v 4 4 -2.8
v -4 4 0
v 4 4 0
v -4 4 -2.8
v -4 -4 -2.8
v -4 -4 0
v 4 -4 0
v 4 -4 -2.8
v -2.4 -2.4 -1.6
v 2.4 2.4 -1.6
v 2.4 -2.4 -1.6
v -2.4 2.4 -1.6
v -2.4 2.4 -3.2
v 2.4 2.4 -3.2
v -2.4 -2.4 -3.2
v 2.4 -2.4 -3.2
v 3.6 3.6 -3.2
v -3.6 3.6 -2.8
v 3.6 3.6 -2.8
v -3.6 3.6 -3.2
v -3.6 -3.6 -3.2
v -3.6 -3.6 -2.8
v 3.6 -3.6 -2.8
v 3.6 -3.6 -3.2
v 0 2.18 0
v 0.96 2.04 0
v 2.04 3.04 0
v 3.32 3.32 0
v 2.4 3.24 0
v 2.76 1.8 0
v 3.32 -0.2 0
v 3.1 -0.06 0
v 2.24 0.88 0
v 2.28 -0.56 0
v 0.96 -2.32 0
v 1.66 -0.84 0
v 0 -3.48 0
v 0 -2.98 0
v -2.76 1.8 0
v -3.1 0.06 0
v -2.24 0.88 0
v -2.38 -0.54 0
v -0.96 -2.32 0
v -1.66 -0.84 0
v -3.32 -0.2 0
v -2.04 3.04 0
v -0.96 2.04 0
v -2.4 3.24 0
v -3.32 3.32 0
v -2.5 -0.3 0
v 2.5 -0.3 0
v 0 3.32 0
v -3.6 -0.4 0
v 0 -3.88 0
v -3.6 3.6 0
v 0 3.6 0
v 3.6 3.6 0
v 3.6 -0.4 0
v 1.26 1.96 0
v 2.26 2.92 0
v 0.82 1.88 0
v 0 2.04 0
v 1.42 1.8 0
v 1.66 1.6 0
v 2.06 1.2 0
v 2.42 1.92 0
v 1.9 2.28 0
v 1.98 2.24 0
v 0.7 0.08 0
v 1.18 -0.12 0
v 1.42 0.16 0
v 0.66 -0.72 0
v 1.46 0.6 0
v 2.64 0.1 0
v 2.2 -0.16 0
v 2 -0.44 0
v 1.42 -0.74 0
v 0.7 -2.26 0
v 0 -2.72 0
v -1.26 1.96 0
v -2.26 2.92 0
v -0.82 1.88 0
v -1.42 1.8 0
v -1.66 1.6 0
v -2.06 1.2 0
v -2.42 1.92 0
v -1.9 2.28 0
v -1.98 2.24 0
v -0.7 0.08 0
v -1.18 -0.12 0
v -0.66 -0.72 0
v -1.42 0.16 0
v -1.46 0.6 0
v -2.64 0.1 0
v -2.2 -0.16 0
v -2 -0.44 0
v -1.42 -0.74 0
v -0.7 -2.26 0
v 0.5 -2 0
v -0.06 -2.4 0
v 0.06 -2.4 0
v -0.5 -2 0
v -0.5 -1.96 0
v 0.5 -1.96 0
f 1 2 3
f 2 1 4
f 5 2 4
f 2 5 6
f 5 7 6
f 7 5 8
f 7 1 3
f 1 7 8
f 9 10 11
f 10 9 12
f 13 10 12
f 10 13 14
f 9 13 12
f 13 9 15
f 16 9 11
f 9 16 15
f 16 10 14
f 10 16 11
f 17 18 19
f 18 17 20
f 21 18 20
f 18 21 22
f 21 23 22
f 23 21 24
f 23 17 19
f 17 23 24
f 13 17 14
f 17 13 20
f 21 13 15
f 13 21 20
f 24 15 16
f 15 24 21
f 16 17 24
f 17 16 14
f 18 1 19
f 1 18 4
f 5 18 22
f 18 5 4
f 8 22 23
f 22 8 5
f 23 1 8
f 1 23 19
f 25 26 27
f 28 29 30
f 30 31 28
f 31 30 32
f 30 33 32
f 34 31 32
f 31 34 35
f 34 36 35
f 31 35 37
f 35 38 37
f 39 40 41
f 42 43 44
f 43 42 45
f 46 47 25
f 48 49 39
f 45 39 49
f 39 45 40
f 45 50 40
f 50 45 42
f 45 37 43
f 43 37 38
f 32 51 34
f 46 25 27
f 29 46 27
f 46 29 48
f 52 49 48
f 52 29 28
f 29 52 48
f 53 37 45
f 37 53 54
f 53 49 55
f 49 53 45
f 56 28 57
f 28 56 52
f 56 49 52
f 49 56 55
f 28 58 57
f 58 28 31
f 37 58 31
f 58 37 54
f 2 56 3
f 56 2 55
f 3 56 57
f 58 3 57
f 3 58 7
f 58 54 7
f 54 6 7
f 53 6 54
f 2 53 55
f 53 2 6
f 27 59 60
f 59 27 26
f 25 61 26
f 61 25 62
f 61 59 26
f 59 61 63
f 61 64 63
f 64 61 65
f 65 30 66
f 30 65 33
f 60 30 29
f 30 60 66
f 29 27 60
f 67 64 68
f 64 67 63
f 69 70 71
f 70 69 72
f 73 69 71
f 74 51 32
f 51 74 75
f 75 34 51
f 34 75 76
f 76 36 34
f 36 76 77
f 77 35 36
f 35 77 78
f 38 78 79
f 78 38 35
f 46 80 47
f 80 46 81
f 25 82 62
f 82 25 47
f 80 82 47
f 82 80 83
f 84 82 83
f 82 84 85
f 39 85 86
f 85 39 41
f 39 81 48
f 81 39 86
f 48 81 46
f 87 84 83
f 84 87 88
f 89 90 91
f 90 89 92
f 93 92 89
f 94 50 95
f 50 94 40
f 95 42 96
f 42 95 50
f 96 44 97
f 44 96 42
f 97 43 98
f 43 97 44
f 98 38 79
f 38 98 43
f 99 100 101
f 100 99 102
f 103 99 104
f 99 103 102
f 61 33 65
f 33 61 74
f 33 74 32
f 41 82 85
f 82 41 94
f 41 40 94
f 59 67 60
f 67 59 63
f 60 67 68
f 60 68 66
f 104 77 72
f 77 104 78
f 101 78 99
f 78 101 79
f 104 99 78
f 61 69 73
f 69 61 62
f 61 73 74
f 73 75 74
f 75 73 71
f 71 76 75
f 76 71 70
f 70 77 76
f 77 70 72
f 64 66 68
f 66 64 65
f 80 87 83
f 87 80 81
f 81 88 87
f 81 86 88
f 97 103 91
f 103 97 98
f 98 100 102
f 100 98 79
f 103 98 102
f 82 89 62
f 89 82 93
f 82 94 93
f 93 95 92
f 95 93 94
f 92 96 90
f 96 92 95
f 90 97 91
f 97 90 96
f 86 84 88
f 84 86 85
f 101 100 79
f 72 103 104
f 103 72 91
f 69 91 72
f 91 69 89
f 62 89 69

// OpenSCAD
// file: ../p/box5.scad
use <../lib.scad>
function ldraw_lib__box5() = [
// 0 Box with 5 Faces and All Edges
// 0 Name: box5.dat
// 0 Author: James Jessiman
// 0 !LDRAW_ORG Primitive UPDATE 2012-01
// 0 !LICENSE Licensed under CC BY 2.0 and CC BY 4.0 : see CAreadme.txt
// 
// 0 BFC CERTIFY CCW
  [0,"BFC","CERTIFY"],
  [0,"BFC","CCW"],
// 
// 0 !HISTORY 2002-04-03 [sbliss] Modified for BFC compliance
// 0 !HISTORY 2002-04-25 [PTadmin] Official Update 2002-02
// 0 !HISTORY 2007-06-24 [PTadmin] Header formatted for Contributor Agreement
// 0 !HISTORY 2008-07-01 [PTadmin] Official Update 2008-01
// 0 !HISTORY 2012-02-16 [Philo] Changed to CCW
// 0 !HISTORY 2012-03-30 [PTadmin] Official Update 2012-01
// 
// 
// 2 24 1 1 1 -1 1 1
  [2,24,1,1,1,-1,1,1],
// 2 24 -1 1 1 -1 1 -1
  [2,24,-1,1,1,-1,1,-1],
// 2 24 -1 1 -1 1 1 -1
  [2,24,-1,1,-1,1,1,-1],
// 2 24 1 1 -1 1 1 1
  [2,24,1,1,-1,1,1,1],
// 2 24 1 0 1 -1 0 1
  [2,24,1,0,1,-1,0,1],
// 2 24 -1 0 1 -1 0 -1
  [2,24,-1,0,1,-1,0,-1],
// 2 24 -1 0 -1 1 0 -1
  [2,24,-1,0,-1,1,0,-1],
// 2 24 1 0 -1 1 0 1
  [2,24,1,0,-1,1,0,1],
// 2 24 1 0 1 1 1 1
  [2,24,1,0,1,1,1,1],
// 2 24 -1 0 1 -1 1 1
  [2,24,-1,0,1,-1,1,1],
// 2 24 1 0 -1 1 1 -1
  [2,24,1,0,-1,1,1,-1],
// 2 24 -1 0 -1 -1 1 -1
  [2,24,-1,0,-1,-1,1,-1],
// 4 16 -1 1 1 1 1 1 1 1 -1 -1 1 -1
  [4,16,-1,1,1,1,1,1,1,1,-1,-1,1,-1],
// 4 16 -1 1 1 -1 0 1 1 0 1 1 1 1
  [4,16,-1,1,1,-1,0,1,1,0,1,1,1,1],
// 4 16 -1 1 -1 -1 0 -1 -1 0 1 -1 1 1
  [4,16,-1,1,-1,-1,0,-1,-1,0,1,-1,1,1],
// 4 16 1 1 -1 1 0 -1 -1 0 -1 -1 1 -1
  [4,16,1,1,-1,1,0,-1,-1,0,-1,-1,1,-1],
// 4 16 1 1 1 1 0 1 1 0 -1 1 1 -1
  [4,16,1,1,1,1,0,1,1,0,-1,1,1,-1],
];
module ldraw_lib__box5(step=0, col=false, unit=2/5, alt=false, line=0.2, solid=!$preview)
    makepoly(ldraw_lib__box5(), step=step, col=col, unit=unit, alt=alt, line=line, solid=solid);
ldraw_lib__box5(line=0.2);
// file: ../p/box4.scad
use <../lib.scad>
function ldraw_lib__box4() = [
// 0 Box with 4 Faces (2 Parallel Pairs) and All Edges
// 0 Name: box4.dat
// 0 Author: James Jessiman
// 0 !LDRAW_ORG Primitive UPDATE 2012-01
// 0 !LICENSE Licensed under CC BY 2.0 and CC BY 4.0 : see CAreadme.txt
// 
// 0 BFC CERTIFY CCW
  [0,"BFC","CERTIFY"],
  [0,"BFC","CCW"],
// 
// 0 !HISTORY 2002-04-03 [sbliss] Modified for BFC compliance
// 0 !HISTORY 2002-04-25 [PTadmin] Official Update 2002-02
// 0 !HISTORY 2007-06-24 [PTadmin] Header formatted for Contributor Agreement
// 0 !HISTORY 2008-07-01 [PTadmin] Official Update 2008-01
// 0 !HISTORY 2012-02-16 [Philo] Changed to CCW
// 0 !HISTORY 2012-03-30 [PTadmin] Official Update 2012-01
// 
// 
// 2 24 1 1 1 -1 1 1
  [2,24,1,1,1,-1,1,1],
// 2 24 -1 1 1 -1 1 -1
  [2,24,-1,1,1,-1,1,-1],
// 2 24 -1 1 -1 1 1 -1
  [2,24,-1,1,-1,1,1,-1],
// 2 24 1 1 -1 1 1 1
  [2,24,1,1,-1,1,1,1],
// 2 24 1 0 1 -1 0 1
  [2,24,1,0,1,-1,0,1],
// 2 24 -1 0 1 -1 0 -1
  [2,24,-1,0,1,-1,0,-1],
// 2 24 -1 0 -1 1 0 -1
  [2,24,-1,0,-1,1,0,-1],
// 2 24 1 0 -1 1 0 1
  [2,24,1,0,-1,1,0,1],
// 2 24 1 0 1 1 1 1
  [2,24,1,0,1,1,1,1],
// 2 24 -1 0 1 -1 1 1
  [2,24,-1,0,1,-1,1,1],
// 2 24 1 0 -1 1 1 -1
  [2,24,1,0,-1,1,1,-1],
// 2 24 -1 0 -1 -1 1 -1
  [2,24,-1,0,-1,-1,1,-1],
// 4 16 -1 1 1 -1 0 1 1 0 1 1 1 1
  [4,16,-1,1,1,-1,0,1,1,0,1,1,1,1],
// 4 16 -1 1 -1 -1 0 -1 -1 0 1 -1 1 1
  [4,16,-1,1,-1,-1,0,-1,-1,0,1,-1,1,1],
// 4 16 1 1 -1 1 0 -1 -1 0 -1 -1 1 -1
  [4,16,1,1,-1,1,0,-1,-1,0,-1,-1,1,-1],
// 4 16 1 1 1 1 0 1 1 0 -1 1 1 -1
  [4,16,1,1,1,1,0,1,1,0,-1,1,1,-1],
];
module ldraw_lib__box4(step=0, col=false, unit=2/5, alt=false, line=0.2, solid=!$preview)
    makepoly(ldraw_lib__box4(), step=step, col=col, unit=unit, alt=alt, line=line, solid=solid);
ldraw_lib__box4(line=0.2);
// file: s/3070bs01.scad
use <../../lib.scad>
use <../../p/box4.scad>
use <../../p/box5.scad>
function ldraw_lib__s__3070bs01() = [
// 0 ~Tile  1 x  1 with Groove without Top Face
// 0 Name: s\3070bs01.dat
// 0 Author: Chris Dee [cwdee]
// 0 !LDRAW_ORG Subpart UPDATE 2009-02
// 0 !LICENSE Licensed under CC BY 2.0 and CC BY 4.0 : see CAreadme.txt
// 
// 0 BFC CERTIFY CCW
  [0,"BFC","CERTIFY"],
  [0,"BFC","CCW"],
// 
// 0 !HISTORY 2009-09-03 [PTadmin] Official Update 2009-02
// 
// 
// 1 16 0 0 0 10 0 0 0 7 0 0 0 10 box4.dat
  [1,16,0,0,0,10,0,0,0,7,0,0,0,10, ldraw_lib__box4()],
// 0 BFC INVERTNEXT
  [0,"BFC","INVERTNEXT"],
// 1 16 0 8 0 6 0 0 0 -4 0 0 0 6 box5.dat
  [1,16,0,8,0,6,0,0,0,-4,0,0,0,6, ldraw_lib__box5()],
// 1 16 0 7 0 9 0 0 0 1 0 0 0 9 box4.dat
  [1,16,0,7,0,9,0,0,0,1,0,0,0,9, ldraw_lib__box4()],
// 
// 4 16 9 8 9 6 8 6 -6 8 6 -9 8 9
  [4,16,9,8,9,6,8,6,-6,8,6,-9,8,9],
// 4 16 -9 8 9 -6 8 6 -6 8 -6 -9 8 -9
  [4,16,-9,8,9,-6,8,6,-6,8,-6,-9,8,-9],
// 4 16 -9 8 -9 -6 8 -6 6 8 -6 9 8 -9
  [4,16,-9,8,-9,-6,8,-6,6,8,-6,9,8,-9],
// 4 16 9 8 -9 6 8 -6 6 8 6 9 8 9
  [4,16,9,8,-9,6,8,-6,6,8,6,9,8,9],
// 
// 4 16 10 7 10 9 7 9 -9 7 9 -10 7 10
  [4,16,10,7,10,9,7,9,-9,7,9,-10,7,10],
// 4 16 -10 7 10 -9 7 9 -9 7 -9 -10 7 -10
  [4,16,-10,7,10,-9,7,9,-9,7,-9,-10,7,-10],
// 4 16 -10 7 -10 -9 7 -9 9 7 -9 10 7 -10
  [4,16,-10,7,-10,-9,7,-9,9,7,-9,10,7,-10],
// 4 16 10 7 -10 9 7 -9 9 7 9 10 7 10
  [4,16,10,7,-10,9,7,-9,9,7,9,10,7,10],
// 0
];
module ldraw_lib__s__3070bs01(step=0, col=false, unit=2/5, alt=false, line=0.2, solid=!$preview)
    makepoly(ldraw_lib__s__3070bs01(), step=step, col=col, unit=unit, alt=alt, line=line, solid=solid);
ldraw_lib__s__3070bs01(line=0.2);
// file: s/3070bpe0s04.scad
use <../../lib.scad>
function ldraw_lib__s__3070bpe0s04() = [
// 0 ~Fox Head
// 0 Name: s\3070bpe0s04.dat
// 0 Author: Johann Eisner [technicbasics]
// 0 !LDRAW_ORG Subpart UPDATE 2019-03
// 0 !LICENSE Licensed under CC BY 2.0 and CC BY 4.0 : see CAreadme.txt
// 
// 0 BFC CERTIFY CCW
  [0,"BFC","CERTIFY"],
  [0,"BFC","CCW"],
// 
// 0 !HISTORY 2019-12-27 [PTadmin] Official Update 2019-03
// 
// 
// 4 16 3.15 0 4.9 3.55 0 4.5 4.75 0 5.7 5.65 0 7.3
  [4,16,3.15,0,4.9,3.55,0,4.5,4.75,0,5.7,5.65,0,7.3],
// 3 16 5.65 0 7.3 4.75 0 5.7 4.95 0 5.6
  [3,16,5.65,0,7.3,4.75,0,5.7,4.95,0,5.6],
// 3 16 5.65 0 7.3 4.95 0 5.6 6.05 0 4.8
  [3,16,5.65,0,7.3,4.95,0,5.6,6.05,0,4.8],
// 4 16 3.55 0 -1.85 1.65 0 -1.8 1.25 0 -4.9 1.75 0 -5.65
  [4,16,3.55,0,-1.85,1.65,0,-1.8,1.25,0,-4.9,1.75,0,-5.65],
// 4 16 0.15 0 -6 0 0 -6.8 1.75 0 -5.65 1.25 0 -5
  [4,16,0.15,0,-6,0,0,-6.8,1.75,0,-5.65,1.25,0,-5],
// 3 16 1.25 0 -4.9 1.25 0 -5 1.75 0 -5.65
  [3,16,1.25,0,-4.9,1.25,0,-5,1.75,0,-5.65],
// 4 16 2.05 0 4.7 0 0 5.1 1.75 0 0.2 3.65 0 1.5
  [4,16,2.05,0,4.7,0,0,5.1,1.75,0,0.2,3.65,0,1.5],
// 3 16 2.05 0 4.7 3.65 0 1.5 6.6 0 0.25
  [3,16,2.05,0,4.7,3.65,0,1.5,6.6,0,0.25],
// 4 16 6.6 0 0.25 3.65 0 1.5 3.55 0 0.4 5.5 0 -0.4
  [4,16,6.6,0,0.25,3.65,0,1.5,3.55,0,0.4,5.5,0,-0.4],
// 4 16 5.5 0 -0.4 3.55 0 0.4 2.95 0 -0.3 5 0 -1.1
  [4,16,5.5,0,-0.4,3.55,0,0.4,2.95,0,-0.3,5,0,-1.1],
// 4 16 5 0 -1.1 2.95 0 -0.3 1.65 0 -1.8 3.55 0 -1.85
  [4,16,5,0,-1.1,2.95,0,-0.3,1.65,0,-1.8,3.55,0,-1.85],
// 4 16 6.05 0 4.8 4.95 0 5.6 4.15 0 4 5.15 0 3
  [4,16,6.05,0,4.8,4.95,0,5.6,4.15,0,4,5.15,0,3],
// 4 16 -4.75 0 5.7 -3.55 0 4.5 -3.15 0 4.9 -5.65 0 7.3
  [4,16,-4.75,0,5.7,-3.55,0,4.5,-3.15,0,4.9,-5.65,0,7.3],
// 3 16 -5.65 0 7.3 -4.95 0 5.6 -4.75 0 5.7
  [3,16,-5.65,0,7.3,-4.95,0,5.6,-4.75,0,5.7],
// 3 16 -5.65 0 7.3 -6.05 0 4.8 -4.95 0 5.6
  [3,16,-5.65,0,7.3,-6.05,0,4.8,-4.95,0,5.6],
// 4 16 -1.25 0 -4.9 -1.65 0 -1.8 -3.55 0 -1.85 -1.75 0 -5.65
  [4,16,-1.25,0,-4.9,-1.65,0,-1.8,-3.55,0,-1.85,-1.75,0,-5.65],
// 4 16 -1.75 0 -5.65 0 0 -6.8 -0.15 0 -6 -1.25 0 -5
  [4,16,-1.75,0,-5.65,0,0,-6.8,-0.15,0,-6,-1.25,0,-5],
// 3 16 -1.25 0 -4.9 -1.75 0 -5.65 -1.25 0 -5
  [3,16,-1.25,0,-4.9,-1.75,0,-5.65,-1.25,0,-5],
// 4 16 -1.75 0 0.2 0 0 5.1 -2.05 0 4.7 -3.65 0 1.5
  [4,16,-1.75,0,0.2,0,0,5.1,-2.05,0,4.7,-3.65,0,1.5],
// 3 16 -2.05 0 4.7 -6.6 0 0.25 -3.65 0 1.5
  [3,16,-2.05,0,4.7,-6.6,0,0.25,-3.65,0,1.5],
// 4 16 -3.55 0 0.4 -3.65 0 1.5 -6.6 0 0.25 -5.5 0 -0.4
  [4,16,-3.55,0,0.4,-3.65,0,1.5,-6.6,0,0.25,-5.5,0,-0.4],
// 4 16 -2.95 0 -0.3 -3.55 0 0.4 -5.5 0 -0.4 -5 0 -1.1
  [4,16,-2.95,0,-0.3,-3.55,0,0.4,-5.5,0,-0.4,-5,0,-1.1],
// 4 16 -1.65 0 -1.8 -2.95 0 -0.3 -5 0 -1.1 -3.55 0 -1.85
  [4,16,-1.65,0,-1.8,-2.95,0,-0.3,-5,0,-1.1,-3.55,0,-1.85],
// 4 16 -4.15 0 4 -4.95 0 5.6 -6.05 0 4.8 -5.15 0 3
  [4,16,-4.15,0,4,-4.95,0,5.6,-6.05,0,4.8,-5.15,0,3],
// 3 16 0.15 0 -6 -0.15 0 -6 0 0 -6.8
  [3,16,0.15,0,-6,-0.15,0,-6,0,0,-6.8],
// 4 16 -1.25 0 -4.9 1.25 0 -4.9 1.65 0 -1.8 -1.65 0 -1.8
  [4,16,-1.25,0,-4.9,1.25,0,-4.9,1.65,0,-1.8,-1.65,0,-1.8],
// 4 16 -1.65 0 -1.8 1.65 0 -1.8 1.75 0 0.2 -1.75 0 0.2
  [4,16,-1.65,0,-1.8,1.65,0,-1.8,1.75,0,0.2,-1.75,0,0.2],
// 3 16 0 0 5.1 -1.75 0 0.2 1.75 0 0.2
  [3,16,0,0,5.1,-1.75,0,0.2,1.75,0,0.2],
];
module ldraw_lib__s__3070bpe0s04(step=0, col=false, unit=2/5, alt=false, line=0.2, solid=!$preview)
    makepoly(ldraw_lib__s__3070bpe0s04(), step=step, col=col, unit=unit, alt=alt, line=line, solid=solid);
ldraw_lib__s__3070bpe0s04(line=0.2);
// file: s/3070bpe0s03.scad
use <../../lib.scad>
function ldraw_lib__s__3070bpe0s03() = [
// 0 ~Fox Head Shadow
// 0 Name: s\3070bpe0s03.dat
// 0 Author: Johann Eisner [technicbasics]
// 0 !LDRAW_ORG Subpart UPDATE 2019-03
// 0 !LICENSE Licensed under CC BY 2.0 and CC BY 4.0 : see CAreadme.txt
// 
// 0 BFC CERTIFY CCW
  [0,"BFC","CERTIFY"],
  [0,"BFC","CCW"],
// 
// 0 !HISTORY 2019-12-27 [PTadmin] Official Update 2019-03
// 
// 
// 4 16 2.4 0 5.1 3.15 0 4.9 5.65 0 7.3 5.1 0 7.6
  [4,16,2.4,0,5.1,3.15,0,4.9,5.65,0,7.3,5.1,0,7.6],
// 4 16 0 0 5.45 0 0 5.1 2.05 0 4.7 2.4 0 5.1
  [4,16,0,0,5.45,0,0,5.1,2.05,0,4.7,2.4,0,5.1],
// 4 16 3.15 0 4.9 2.4 0 5.1 2.05 0 4.7 3.55 0 4.5
  [4,16,3.15,0,4.9,2.4,0,5.1,2.05,0,4.7,3.55,0,4.5],
// 4 16 4.15 0 4 3.55 0 4.5 2.05 0 4.7 5.15 0 3
  [4,16,4.15,0,4,3.55,0,4.5,2.05,0,4.7,5.15,0,3],
// 4 16 6.9 0 4.5 6.05 0 4.8 5.15 0 3 5.6 0 2.2
  [4,16,6.9,0,4.5,6.05,0,4.8,5.15,0,3,5.6,0,2.2],
// 4 16 6.05 0 4.8 6.9 0 4.5 6 0 8.1 5.65 0 7.3
  [4,16,6.05,0,4.8,6.9,0,4.5,6,0,8.1,5.65,0,7.3],
// 3 16 6 0 8.1 5.1 0 7.6 5.65 0 7.3
  [3,16,6,0,8.1,5.1,0,7.6,5.65,0,7.3],
// 4 16 3.55 0 4.5 4.15 0 4 4.95 0 5.6 4.75 0 5.7
  [4,16,3.55,0,4.5,4.15,0,4,4.95,0,5.6,4.75,0,5.7],
// 4 16 1.75 0 0.2 1.65 0 -1.8 2.95 0 -0.3 3.55 0 0.4
  [4,16,1.75,0,0.2,1.65,0,-1.8,2.95,0,-0.3,3.55,0,0.4],
// 3 16 3.65 0 1.5 1.75 0 0.2 3.55 0 0.4
  [3,16,3.65,0,1.5,1.75,0,0.2,3.55,0,0.4],
// 4 16 7.75 0 -0.15 6.6 0 0.25 5.5 0 -0.4 6.25 0 -0.75
  [4,16,7.75,0,-0.15,6.6,0,0.25,5.5,0,-0.4,6.25,0,-0.75],
// 4 16 5.5 0 -0.4 5 0 -1.1 5.7 0 -1.4 6.25 0 -0.75
  [4,16,5.5,0,-0.4,5,0,-1.1,5.7,0,-1.4,6.25,0,-0.75],
// 4 16 4.15 0 -2.1 5.7 0 -1.4 5 0 -1.1 3.55 0 -1.85
  [4,16,4.15,0,-2.1,5.7,0,-1.4,5,0,-1.1,3.55,0,-1.85],
// 4 16 2.4 0 -5.8 4.15 0 -2.1 3.55 0 -1.85 1.75 0 -5.65
  [4,16,2.4,0,-5.8,4.15,0,-2.1,3.55,0,-1.85,1.75,0,-5.65],
// 4 16 0 0 -6.8 0 0 -7.45 2.4 0 -5.8 1.75 0 -5.65
  [4,16,0,0,-6.8,0,0,-7.45,2.4,0,-5.8,1.75,0,-5.65],
// 4 16 -5.65 0 7.3 -3.15 0 4.9 -2.4 0 5.1 -5.1 0 7.6
  [4,16,-5.65,0,7.3,-3.15,0,4.9,-2.4,0,5.1,-5.1,0,7.6],
// 4 16 -2.05 0 4.7 0 0 5.1 0 0 5.45 -2.4 0 5.1
  [4,16,-2.05,0,4.7,0,0,5.1,0,0,5.45,-2.4,0,5.1],
// 4 16 -2.05 0 4.7 -2.4 0 5.1 -3.15 0 4.9 -3.55 0 4.5
  [4,16,-2.05,0,4.7,-2.4,0,5.1,-3.15,0,4.9,-3.55,0,4.5],
// 4 16 -2.05 0 4.7 -3.55 0 4.5 -4.15 0 4 -5.15 0 3
  [4,16,-2.05,0,4.7,-3.55,0,4.5,-4.15,0,4,-5.15,0,3],
// 4 16 -5.15 0 3 -6.05 0 4.8 -6.9 0 4.5 -5.6 0 2.2
  [4,16,-5.15,0,3,-6.05,0,4.8,-6.9,0,4.5,-5.6,0,2.2],
// 4 16 -6 0 8.1 -6.9 0 4.5 -6.05 0 4.8 -5.65 0 7.3
  [4,16,-6,0,8.1,-6.9,0,4.5,-6.05,0,4.8,-5.65,0,7.3],
// 3 16 -6 0 8.1 -5.65 0 7.3 -5.1 0 7.6
  [3,16,-6,0,8.1,-5.65,0,7.3,-5.1,0,7.6],
// 4 16 -4.95 0 5.6 -4.15 0 4 -3.55 0 4.5 -4.75 0 5.7
  [4,16,-4.95,0,5.6,-4.15,0,4,-3.55,0,4.5,-4.75,0,5.7],
// 4 16 -2.95 0 -0.3 -1.65 0 -1.8 -1.75 0 0.2 -3.55 0 0.4
  [4,16,-2.95,0,-0.3,-1.65,0,-1.8,-1.75,0,0.2,-3.55,0,0.4],
// 3 16 -3.65 0 1.5 -3.55 0 0.4 -1.75 0 0.2
  [3,16,-3.65,0,1.5,-3.55,0,0.4,-1.75,0,0.2],
// 4 16 -5.5 0 -0.4 -6.6 0 0.25 -7.75 0 0.15 -6.25 0 -0.75
  [4,16,-5.5,0,-0.4,-6.6,0,0.25,-7.75,0,0.15,-6.25,0,-0.75],
// 4 16 -5.95 0 -1.35 -5 0 -1.1 -5.5 0 -0.4 -6.25 0 -0.75
  [4,16,-5.95,0,-1.35,-5,0,-1.1,-5.5,0,-0.4,-6.25,0,-0.75],
// 4 16 -5 0 -1.1 -5.95 0 -1.35 -4.15 0 -2.1 -3.55 0 -1.85
  [4,16,-5,0,-1.1,-5.95,0,-1.35,-4.15,0,-2.1,-3.55,0,-1.85],
// 4 16 -3.55 0 -1.85 -4.15 0 -2.1 -2.4 0 -5.8 -1.75 0 -5.65
  [4,16,-3.55,0,-1.85,-4.15,0,-2.1,-2.4,0,-5.8,-1.75,0,-5.65],
// 4 16 -2.4 0 -5.8 0 0 -7.45 0 0 -6.8 -1.75 0 -5.65
  [4,16,-2.4,0,-5.8,0,0,-7.45,0,0,-6.8,-1.75,0,-5.65],
// 4 16 -1.25 0 -5 -0.15 0 -6 0.15 0 -6 1.25 0 -5
  [4,16,-1.25,0,-5,-0.15,0,-6,0.15,0,-6,1.25,0,-5],
// 4 16 -1.25 0 -5 1.25 0 -5 1.25 0 -4.9 -1.25 0 -4.9
  [4,16,-1.25,0,-5,1.25,0,-5,1.25,0,-4.9,-1.25,0,-4.9],
// 4 16 5.6 0 2.2 5.15 0 3 2.05 0 4.7 6.6 0 0.25
  [4,16,5.6,0,2.2,5.15,0,3,2.05,0,4.7,6.6,0,0.25],
// 3 16 5.6 0 2.2 6.6 0 0.25 7.75 0 -0.15
  [3,16,5.6,0,2.2,6.6,0,0.25,7.75,0,-0.15],
// 4 16 -2.05 0 4.7 -5.15 0 3 -5.6 0 2.2 -6.6 0 0.25
  [4,16,-2.05,0,4.7,-5.15,0,3,-5.6,0,2.2,-6.6,0,0.25],
// 3 16 -5.6 0 2.2 -7.75 0 0.15 -6.6 0 0.25
  [3,16,-5.6,0,2.2,-7.75,0,0.15,-6.6,0,0.25],
];
module ldraw_lib__s__3070bpe0s03(step=0, col=false, unit=2/5, alt=false, line=0.2, solid=!$preview)
    makepoly(ldraw_lib__s__3070bpe0s03(), step=step, col=col, unit=unit, alt=alt, line=line, solid=solid);
ldraw_lib__s__3070bpe0s03(line=0.2);
// file: s/3070bpe0s02.scad
use <../../lib.scad>
function ldraw_lib__s__3070bpe0s02() = [
// 0 ~Pentagonal Shield Frame
// 0 Name: s\3070bpe0s02.dat
// 0 Author: Johann Eisner [technicbasics]
// 0 !LDRAW_ORG Subpart UPDATE 2019-03
// 0 !LICENSE Licensed under CC BY 2.0 and CC BY 4.0 : see CAreadme.txt
// 
// 0 BFC CERTIFY CCW
  [0,"BFC","CERTIFY"],
  [0,"BFC","CCW"],
// 
// 0 !HISTORY 2019-12-27 [PTadmin] Official Update 2019-03
// 
// 
// 4 0 -9 0 -1 0 0 -9.7 0 0 -8.7 -8.3 0 -0.5
  [4,0,-9,0,-1,0,0,-9.7,0,0,-8.7,-8.3,0,-0.5],
// 4 0 -9 0 9 -9 0 -1 -8.3 0 -.5 -8.3 0 8.3
  [4,0,-9,0,9,-9,0,-1,-8.3,0,-.5,-8.3,0,8.3],
// 4 0 9 0 9 0 0 9 0 0 8.3 8.3 0 8.3
  [4,0,9,0,9,0,0,9,0,0,8.3,8.3,0,8.3],
// 4 0 0 0 9 -9 0 9 -8.3 0 8.3 0 0 8.3
  [4,0,0,0,9,-9,0,9,-8.3,0,8.3,0,0,8.3],
// 4 0 9 0 9 8.3 0 8.3 8.3 0 -.5 9 0 -1
  [4,0,9,0,9,8.3,0,8.3,8.3,0,-.5,9,0,-1],
// 4 0 9 0 -1 8.3 0 -0.5 0 0 -8.7 0 0 -9.7
  [4,0,9,0,-1,8.3,0,-0.5,0,0,-8.7,0,0,-9.7],
// 4 16 -10 0 10 -9 0 9 0 0 9 10 0 10
  [4,16,-10,0,10,-9,0,9,0,0,9,10,0,10],
// 3 16 10 0 10 0 0 9 9 0 9
  [3,16,10,0,10,0,0,9,9,0,9],
// 4 16 10 0 10 9 0 9 9 0 -1 10 0 -10
  [4,16,10,0,10,9,0,9,9,0,-1,10,0,-10],
// 3 16 9 0 -1 0 0 -9.7 10 0 -10
  [3,16,9,0,-1,0,0,-9.7,10,0,-10],
// 3 16 0 0 -9.7 -10 0 -10 10 0 -10
  [3,16,0,0,-9.7,-10,0,-10,10,0,-10],
// 3 16 -9 0 -1 -10 0 -10 0 0 -9.7
  [3,16,-9,0,-1,-10,0,-10,0,0,-9.7],
// 4 16 -10 0 10 -10 0 -10 -9 0 -1 -9 0 9
  [4,16,-10,0,10,-10,0,-10,-9,0,-1,-9,0,9],
];
module ldraw_lib__s__3070bpe0s02(step=0, col=false, unit=2/5, alt=false, line=0.2, solid=!$preview)
    makepoly(ldraw_lib__s__3070bpe0s02(), step=step, col=col, unit=unit, alt=alt, line=line, solid=solid);
ldraw_lib__s__3070bpe0s02(line=0.2);
// file: s/3070bpe0s01.scad
use <../../lib.scad>
function ldraw_lib__s__3070bpe0s01() = [
// 0 ~Background for Fox Head
// 0 Name: s\3070bpe0s01.dat
// 0 Author: Johann Eisner [technicbasics]
// 0 !LDRAW_ORG Subpart UPDATE 2019-03
// 0 !LICENSE Licensed under CC BY 2.0 and CC BY 4.0 : see CAreadme.txt
// 
// 0 BFC CERTIFY CCW
  [0,"BFC","CERTIFY"],
  [0,"BFC","CCW"],
// 
// 0 !HISTORY 2019-12-27 [PTadmin] Official Update 2019-03
// 
// 
// 3 16 0 0 5.45 2.4 0 5.1 5.1 0 7.6
  [3,16,0,0,5.45,2.4,0,5.1,5.1,0,7.6],
// 3 16 8.3 0 8.3 6 0 8.1 6.9 0 4.5
  [3,16,8.3,0,8.3,6,0,8.1,6.9,0,4.5],
// 4 16 8.3 0 8.3 6.9 0 4.5 7.75 0 -0.15 8.3 0 -0.5
  [4,16,8.3,0,8.3,6.9,0,4.5,7.75,0,-0.15,8.3,0,-0.5],
// 3 16 6.9 0 4.5 5.6 0 2.2 7.75 0 -0.15
  [3,16,6.9,0,4.5,5.6,0,2.2,7.75,0,-0.15],
// 4 16 8.3 0 -0.5 7.75 0 -0.15 5.7 0 -1.4 2.4 0 -5.8
  [4,16,8.3,0,-0.5,7.75,0,-0.15,5.7,0,-1.4,2.4,0,-5.8],
// 3 16 5.7 0 -1.4 4.15 0 -2.1 2.4 0 -5.8
  [3,16,5.7,0,-1.4,4.15,0,-2.1,2.4,0,-5.8],
// 3 16 8.3 0 -0.5 2.4 0 -5.8 0 0 -8.7
  [3,16,8.3,0,-0.5,2.4,0,-5.8,0,0,-8.7],
// 3 16 2.4 0 -5.8 0 0 -7.45 0 0 -8.7
  [3,16,2.4,0,-5.8,0,0,-7.45,0,0,-8.7],
// 3 16 -6.9 0 4.5 -7.75 0 0.15 -5.6 0 2.2
  [3,16,-6.9,0,4.5,-7.75,0,0.15,-5.6,0,2.2],
// 4 16 -2.4 0 -5.8 -4.15 0 -2.1 -5.95 0 -1.35 -8.3 0 -0.5
  [4,16,-2.4,0,-5.8,-4.15,0,-2.1,-5.95,0,-1.35,-8.3,0,-0.5],
// 3 16 -5.1 0 7.6 -2.4 0 5.1 0 0 5.45
  [3,16,-5.1,0,7.6,-2.4,0,5.1,0,0,5.45],
// 3 16 -6 0 8.1 -8.3 0 8.3 -6.9 0 4.5
  [3,16,-6,0,8.1,-8.3,0,8.3,-6.9,0,4.5],
// 4 16 -6.9 0 4.5 -8.3 0 8.3 -8.3 0 -0.5 -7.75 0 0.15
  [4,16,-6.9,0,4.5,-8.3,0,8.3,-8.3,0,-0.5,-7.75,0,0.15],
// 4 16 -7.75 0 0.15 -8.3 0 -0.5 -5.95 0 -1.35 -6.25 0 -0.75
  [4,16,-7.75,0,0.15,-8.3,0,-0.5,-5.95,0,-1.35,-6.25,0,-0.75],
// 3 16 -8.3 0 -0.5 0 0 -8.7 -2.4 0 -5.8
  [3,16,-8.3,0,-0.5,0,0,-8.7,-2.4,0,-5.8],
// 3 16 -2.4 0 -5.8 0 0 -8.7 0 0 -7.45
  [3,16,-2.4,0,-5.8,0,0,-8.7,0,0,-7.45],
// 3 16 7.75 0 -0.15 6.25 0 -0.75 5.7 0 -1.4
  [3,16,7.75,0,-0.15,6.25,0,-0.75,5.7,0,-1.4],
// 3 16 -5.1 0 7.6 0 0 5.45 5.1 0 7.6
  [3,16,-5.1,0,7.6,0,0,5.45,5.1,0,7.6],
// 4 16 -6 0 8.1 -5.1 0 7.6 5.1 0 7.6 6 0 8.1
  [4,16,-6,0,8.1,-5.1,0,7.6,5.1,0,7.6,6,0,8.1],
// 3 16 0 0 8.3 -8.3 0 8.3 -6 0 8.1
  [3,16,0,0,8.3,-8.3,0,8.3,-6,0,8.1],
// 4 16 -6 0 8.1 6 0 8.1 8.3 0 8.3 0 0 8.3
  [4,16,-6,0,8.1,6,0,8.1,8.3,0,8.3,0,0,8.3],
];
module ldraw_lib__s__3070bpe0s01(step=0, col=false, unit=2/5, alt=false, line=0.2, solid=!$preview)
    makepoly(ldraw_lib__s__3070bpe0s01(), step=step, col=col, unit=unit, alt=alt, line=line, solid=solid);
ldraw_lib__s__3070bpe0s01(line=0.2);
// main file
use <../lib.scad>
use <s/3070bpe0s01.scad>
use <s/3070bpe0s02.scad>
use <s/3070bpe0s03.scad>
use <s/3070bpe0s04.scad>
use <s/3070bs01.scad>
function ldraw_lib__3070bpe0() = [
// 0 Tile  1 x  1 with Orange Fox Head on Lime Pentagonal Shield Pattern
// 0 Name: 3070bpe0.dat
// 0 Author: Johann Eisner [technicbasics]
// 0 !LDRAW_ORG Part UPDATE 2019-03
// 0 !LICENSE Licensed under CC BY 2.0 and CC BY 4.0 : see CAreadme.txt
// 
// 0 BFC CERTIFY CCW
  [0,"BFC","CERTIFY"],
  [0,"BFC","CCW"],
// 
// 0 !HISTORY 2019-12-27 [PTadmin] Official Update 2019-03
// 
// 
// 1 16 0 0 0 1 0 0 0 1 0 0 0 1 s\3070bs01.dat
  [1,16,0,0,0,1,0,0,0,1,0,0,0,1, ldraw_lib__s__3070bs01()],
// 1 27 0 0 0 1 0 0 0 1 0 0 0 1 s\3070bpe0s01.dat
  [1,27,0,0,0,1,0,0,0,1,0,0,0,1, ldraw_lib__s__3070bpe0s01()],
// 1 16 0 0 0 1 0 0 0 1 0 0 0 1 s\3070bpe0s02.dat
  [1,16,0,0,0,1,0,0,0,1,0,0,0,1, ldraw_lib__s__3070bpe0s02()],
// 1 115 0 0 0 1 0 0 0 1 0 0 0 1 s\3070bpe0s03.dat
  [1,115,0,0,0,1,0,0,0,1,0,0,0,1, ldraw_lib__s__3070bpe0s03()],
// 1 25 0 0 0 1 0 0 0 1 0 0 0 1 s\3070bpe0s04.dat
  [1,25,0,0,0,1,0,0,0,1,0,0,0,1, ldraw_lib__s__3070bpe0s04()],
];
module ldraw_lib__3070bpe0(step=0, col=false, unit=2/5, alt=false, line=0.2, solid=!$preview)
    makepoly(ldraw_lib__3070bpe0(), step=step, col=col, unit=unit, alt=alt, line=line, solid=solid);
ldraw_lib__3070bpe0(line=0.2);
